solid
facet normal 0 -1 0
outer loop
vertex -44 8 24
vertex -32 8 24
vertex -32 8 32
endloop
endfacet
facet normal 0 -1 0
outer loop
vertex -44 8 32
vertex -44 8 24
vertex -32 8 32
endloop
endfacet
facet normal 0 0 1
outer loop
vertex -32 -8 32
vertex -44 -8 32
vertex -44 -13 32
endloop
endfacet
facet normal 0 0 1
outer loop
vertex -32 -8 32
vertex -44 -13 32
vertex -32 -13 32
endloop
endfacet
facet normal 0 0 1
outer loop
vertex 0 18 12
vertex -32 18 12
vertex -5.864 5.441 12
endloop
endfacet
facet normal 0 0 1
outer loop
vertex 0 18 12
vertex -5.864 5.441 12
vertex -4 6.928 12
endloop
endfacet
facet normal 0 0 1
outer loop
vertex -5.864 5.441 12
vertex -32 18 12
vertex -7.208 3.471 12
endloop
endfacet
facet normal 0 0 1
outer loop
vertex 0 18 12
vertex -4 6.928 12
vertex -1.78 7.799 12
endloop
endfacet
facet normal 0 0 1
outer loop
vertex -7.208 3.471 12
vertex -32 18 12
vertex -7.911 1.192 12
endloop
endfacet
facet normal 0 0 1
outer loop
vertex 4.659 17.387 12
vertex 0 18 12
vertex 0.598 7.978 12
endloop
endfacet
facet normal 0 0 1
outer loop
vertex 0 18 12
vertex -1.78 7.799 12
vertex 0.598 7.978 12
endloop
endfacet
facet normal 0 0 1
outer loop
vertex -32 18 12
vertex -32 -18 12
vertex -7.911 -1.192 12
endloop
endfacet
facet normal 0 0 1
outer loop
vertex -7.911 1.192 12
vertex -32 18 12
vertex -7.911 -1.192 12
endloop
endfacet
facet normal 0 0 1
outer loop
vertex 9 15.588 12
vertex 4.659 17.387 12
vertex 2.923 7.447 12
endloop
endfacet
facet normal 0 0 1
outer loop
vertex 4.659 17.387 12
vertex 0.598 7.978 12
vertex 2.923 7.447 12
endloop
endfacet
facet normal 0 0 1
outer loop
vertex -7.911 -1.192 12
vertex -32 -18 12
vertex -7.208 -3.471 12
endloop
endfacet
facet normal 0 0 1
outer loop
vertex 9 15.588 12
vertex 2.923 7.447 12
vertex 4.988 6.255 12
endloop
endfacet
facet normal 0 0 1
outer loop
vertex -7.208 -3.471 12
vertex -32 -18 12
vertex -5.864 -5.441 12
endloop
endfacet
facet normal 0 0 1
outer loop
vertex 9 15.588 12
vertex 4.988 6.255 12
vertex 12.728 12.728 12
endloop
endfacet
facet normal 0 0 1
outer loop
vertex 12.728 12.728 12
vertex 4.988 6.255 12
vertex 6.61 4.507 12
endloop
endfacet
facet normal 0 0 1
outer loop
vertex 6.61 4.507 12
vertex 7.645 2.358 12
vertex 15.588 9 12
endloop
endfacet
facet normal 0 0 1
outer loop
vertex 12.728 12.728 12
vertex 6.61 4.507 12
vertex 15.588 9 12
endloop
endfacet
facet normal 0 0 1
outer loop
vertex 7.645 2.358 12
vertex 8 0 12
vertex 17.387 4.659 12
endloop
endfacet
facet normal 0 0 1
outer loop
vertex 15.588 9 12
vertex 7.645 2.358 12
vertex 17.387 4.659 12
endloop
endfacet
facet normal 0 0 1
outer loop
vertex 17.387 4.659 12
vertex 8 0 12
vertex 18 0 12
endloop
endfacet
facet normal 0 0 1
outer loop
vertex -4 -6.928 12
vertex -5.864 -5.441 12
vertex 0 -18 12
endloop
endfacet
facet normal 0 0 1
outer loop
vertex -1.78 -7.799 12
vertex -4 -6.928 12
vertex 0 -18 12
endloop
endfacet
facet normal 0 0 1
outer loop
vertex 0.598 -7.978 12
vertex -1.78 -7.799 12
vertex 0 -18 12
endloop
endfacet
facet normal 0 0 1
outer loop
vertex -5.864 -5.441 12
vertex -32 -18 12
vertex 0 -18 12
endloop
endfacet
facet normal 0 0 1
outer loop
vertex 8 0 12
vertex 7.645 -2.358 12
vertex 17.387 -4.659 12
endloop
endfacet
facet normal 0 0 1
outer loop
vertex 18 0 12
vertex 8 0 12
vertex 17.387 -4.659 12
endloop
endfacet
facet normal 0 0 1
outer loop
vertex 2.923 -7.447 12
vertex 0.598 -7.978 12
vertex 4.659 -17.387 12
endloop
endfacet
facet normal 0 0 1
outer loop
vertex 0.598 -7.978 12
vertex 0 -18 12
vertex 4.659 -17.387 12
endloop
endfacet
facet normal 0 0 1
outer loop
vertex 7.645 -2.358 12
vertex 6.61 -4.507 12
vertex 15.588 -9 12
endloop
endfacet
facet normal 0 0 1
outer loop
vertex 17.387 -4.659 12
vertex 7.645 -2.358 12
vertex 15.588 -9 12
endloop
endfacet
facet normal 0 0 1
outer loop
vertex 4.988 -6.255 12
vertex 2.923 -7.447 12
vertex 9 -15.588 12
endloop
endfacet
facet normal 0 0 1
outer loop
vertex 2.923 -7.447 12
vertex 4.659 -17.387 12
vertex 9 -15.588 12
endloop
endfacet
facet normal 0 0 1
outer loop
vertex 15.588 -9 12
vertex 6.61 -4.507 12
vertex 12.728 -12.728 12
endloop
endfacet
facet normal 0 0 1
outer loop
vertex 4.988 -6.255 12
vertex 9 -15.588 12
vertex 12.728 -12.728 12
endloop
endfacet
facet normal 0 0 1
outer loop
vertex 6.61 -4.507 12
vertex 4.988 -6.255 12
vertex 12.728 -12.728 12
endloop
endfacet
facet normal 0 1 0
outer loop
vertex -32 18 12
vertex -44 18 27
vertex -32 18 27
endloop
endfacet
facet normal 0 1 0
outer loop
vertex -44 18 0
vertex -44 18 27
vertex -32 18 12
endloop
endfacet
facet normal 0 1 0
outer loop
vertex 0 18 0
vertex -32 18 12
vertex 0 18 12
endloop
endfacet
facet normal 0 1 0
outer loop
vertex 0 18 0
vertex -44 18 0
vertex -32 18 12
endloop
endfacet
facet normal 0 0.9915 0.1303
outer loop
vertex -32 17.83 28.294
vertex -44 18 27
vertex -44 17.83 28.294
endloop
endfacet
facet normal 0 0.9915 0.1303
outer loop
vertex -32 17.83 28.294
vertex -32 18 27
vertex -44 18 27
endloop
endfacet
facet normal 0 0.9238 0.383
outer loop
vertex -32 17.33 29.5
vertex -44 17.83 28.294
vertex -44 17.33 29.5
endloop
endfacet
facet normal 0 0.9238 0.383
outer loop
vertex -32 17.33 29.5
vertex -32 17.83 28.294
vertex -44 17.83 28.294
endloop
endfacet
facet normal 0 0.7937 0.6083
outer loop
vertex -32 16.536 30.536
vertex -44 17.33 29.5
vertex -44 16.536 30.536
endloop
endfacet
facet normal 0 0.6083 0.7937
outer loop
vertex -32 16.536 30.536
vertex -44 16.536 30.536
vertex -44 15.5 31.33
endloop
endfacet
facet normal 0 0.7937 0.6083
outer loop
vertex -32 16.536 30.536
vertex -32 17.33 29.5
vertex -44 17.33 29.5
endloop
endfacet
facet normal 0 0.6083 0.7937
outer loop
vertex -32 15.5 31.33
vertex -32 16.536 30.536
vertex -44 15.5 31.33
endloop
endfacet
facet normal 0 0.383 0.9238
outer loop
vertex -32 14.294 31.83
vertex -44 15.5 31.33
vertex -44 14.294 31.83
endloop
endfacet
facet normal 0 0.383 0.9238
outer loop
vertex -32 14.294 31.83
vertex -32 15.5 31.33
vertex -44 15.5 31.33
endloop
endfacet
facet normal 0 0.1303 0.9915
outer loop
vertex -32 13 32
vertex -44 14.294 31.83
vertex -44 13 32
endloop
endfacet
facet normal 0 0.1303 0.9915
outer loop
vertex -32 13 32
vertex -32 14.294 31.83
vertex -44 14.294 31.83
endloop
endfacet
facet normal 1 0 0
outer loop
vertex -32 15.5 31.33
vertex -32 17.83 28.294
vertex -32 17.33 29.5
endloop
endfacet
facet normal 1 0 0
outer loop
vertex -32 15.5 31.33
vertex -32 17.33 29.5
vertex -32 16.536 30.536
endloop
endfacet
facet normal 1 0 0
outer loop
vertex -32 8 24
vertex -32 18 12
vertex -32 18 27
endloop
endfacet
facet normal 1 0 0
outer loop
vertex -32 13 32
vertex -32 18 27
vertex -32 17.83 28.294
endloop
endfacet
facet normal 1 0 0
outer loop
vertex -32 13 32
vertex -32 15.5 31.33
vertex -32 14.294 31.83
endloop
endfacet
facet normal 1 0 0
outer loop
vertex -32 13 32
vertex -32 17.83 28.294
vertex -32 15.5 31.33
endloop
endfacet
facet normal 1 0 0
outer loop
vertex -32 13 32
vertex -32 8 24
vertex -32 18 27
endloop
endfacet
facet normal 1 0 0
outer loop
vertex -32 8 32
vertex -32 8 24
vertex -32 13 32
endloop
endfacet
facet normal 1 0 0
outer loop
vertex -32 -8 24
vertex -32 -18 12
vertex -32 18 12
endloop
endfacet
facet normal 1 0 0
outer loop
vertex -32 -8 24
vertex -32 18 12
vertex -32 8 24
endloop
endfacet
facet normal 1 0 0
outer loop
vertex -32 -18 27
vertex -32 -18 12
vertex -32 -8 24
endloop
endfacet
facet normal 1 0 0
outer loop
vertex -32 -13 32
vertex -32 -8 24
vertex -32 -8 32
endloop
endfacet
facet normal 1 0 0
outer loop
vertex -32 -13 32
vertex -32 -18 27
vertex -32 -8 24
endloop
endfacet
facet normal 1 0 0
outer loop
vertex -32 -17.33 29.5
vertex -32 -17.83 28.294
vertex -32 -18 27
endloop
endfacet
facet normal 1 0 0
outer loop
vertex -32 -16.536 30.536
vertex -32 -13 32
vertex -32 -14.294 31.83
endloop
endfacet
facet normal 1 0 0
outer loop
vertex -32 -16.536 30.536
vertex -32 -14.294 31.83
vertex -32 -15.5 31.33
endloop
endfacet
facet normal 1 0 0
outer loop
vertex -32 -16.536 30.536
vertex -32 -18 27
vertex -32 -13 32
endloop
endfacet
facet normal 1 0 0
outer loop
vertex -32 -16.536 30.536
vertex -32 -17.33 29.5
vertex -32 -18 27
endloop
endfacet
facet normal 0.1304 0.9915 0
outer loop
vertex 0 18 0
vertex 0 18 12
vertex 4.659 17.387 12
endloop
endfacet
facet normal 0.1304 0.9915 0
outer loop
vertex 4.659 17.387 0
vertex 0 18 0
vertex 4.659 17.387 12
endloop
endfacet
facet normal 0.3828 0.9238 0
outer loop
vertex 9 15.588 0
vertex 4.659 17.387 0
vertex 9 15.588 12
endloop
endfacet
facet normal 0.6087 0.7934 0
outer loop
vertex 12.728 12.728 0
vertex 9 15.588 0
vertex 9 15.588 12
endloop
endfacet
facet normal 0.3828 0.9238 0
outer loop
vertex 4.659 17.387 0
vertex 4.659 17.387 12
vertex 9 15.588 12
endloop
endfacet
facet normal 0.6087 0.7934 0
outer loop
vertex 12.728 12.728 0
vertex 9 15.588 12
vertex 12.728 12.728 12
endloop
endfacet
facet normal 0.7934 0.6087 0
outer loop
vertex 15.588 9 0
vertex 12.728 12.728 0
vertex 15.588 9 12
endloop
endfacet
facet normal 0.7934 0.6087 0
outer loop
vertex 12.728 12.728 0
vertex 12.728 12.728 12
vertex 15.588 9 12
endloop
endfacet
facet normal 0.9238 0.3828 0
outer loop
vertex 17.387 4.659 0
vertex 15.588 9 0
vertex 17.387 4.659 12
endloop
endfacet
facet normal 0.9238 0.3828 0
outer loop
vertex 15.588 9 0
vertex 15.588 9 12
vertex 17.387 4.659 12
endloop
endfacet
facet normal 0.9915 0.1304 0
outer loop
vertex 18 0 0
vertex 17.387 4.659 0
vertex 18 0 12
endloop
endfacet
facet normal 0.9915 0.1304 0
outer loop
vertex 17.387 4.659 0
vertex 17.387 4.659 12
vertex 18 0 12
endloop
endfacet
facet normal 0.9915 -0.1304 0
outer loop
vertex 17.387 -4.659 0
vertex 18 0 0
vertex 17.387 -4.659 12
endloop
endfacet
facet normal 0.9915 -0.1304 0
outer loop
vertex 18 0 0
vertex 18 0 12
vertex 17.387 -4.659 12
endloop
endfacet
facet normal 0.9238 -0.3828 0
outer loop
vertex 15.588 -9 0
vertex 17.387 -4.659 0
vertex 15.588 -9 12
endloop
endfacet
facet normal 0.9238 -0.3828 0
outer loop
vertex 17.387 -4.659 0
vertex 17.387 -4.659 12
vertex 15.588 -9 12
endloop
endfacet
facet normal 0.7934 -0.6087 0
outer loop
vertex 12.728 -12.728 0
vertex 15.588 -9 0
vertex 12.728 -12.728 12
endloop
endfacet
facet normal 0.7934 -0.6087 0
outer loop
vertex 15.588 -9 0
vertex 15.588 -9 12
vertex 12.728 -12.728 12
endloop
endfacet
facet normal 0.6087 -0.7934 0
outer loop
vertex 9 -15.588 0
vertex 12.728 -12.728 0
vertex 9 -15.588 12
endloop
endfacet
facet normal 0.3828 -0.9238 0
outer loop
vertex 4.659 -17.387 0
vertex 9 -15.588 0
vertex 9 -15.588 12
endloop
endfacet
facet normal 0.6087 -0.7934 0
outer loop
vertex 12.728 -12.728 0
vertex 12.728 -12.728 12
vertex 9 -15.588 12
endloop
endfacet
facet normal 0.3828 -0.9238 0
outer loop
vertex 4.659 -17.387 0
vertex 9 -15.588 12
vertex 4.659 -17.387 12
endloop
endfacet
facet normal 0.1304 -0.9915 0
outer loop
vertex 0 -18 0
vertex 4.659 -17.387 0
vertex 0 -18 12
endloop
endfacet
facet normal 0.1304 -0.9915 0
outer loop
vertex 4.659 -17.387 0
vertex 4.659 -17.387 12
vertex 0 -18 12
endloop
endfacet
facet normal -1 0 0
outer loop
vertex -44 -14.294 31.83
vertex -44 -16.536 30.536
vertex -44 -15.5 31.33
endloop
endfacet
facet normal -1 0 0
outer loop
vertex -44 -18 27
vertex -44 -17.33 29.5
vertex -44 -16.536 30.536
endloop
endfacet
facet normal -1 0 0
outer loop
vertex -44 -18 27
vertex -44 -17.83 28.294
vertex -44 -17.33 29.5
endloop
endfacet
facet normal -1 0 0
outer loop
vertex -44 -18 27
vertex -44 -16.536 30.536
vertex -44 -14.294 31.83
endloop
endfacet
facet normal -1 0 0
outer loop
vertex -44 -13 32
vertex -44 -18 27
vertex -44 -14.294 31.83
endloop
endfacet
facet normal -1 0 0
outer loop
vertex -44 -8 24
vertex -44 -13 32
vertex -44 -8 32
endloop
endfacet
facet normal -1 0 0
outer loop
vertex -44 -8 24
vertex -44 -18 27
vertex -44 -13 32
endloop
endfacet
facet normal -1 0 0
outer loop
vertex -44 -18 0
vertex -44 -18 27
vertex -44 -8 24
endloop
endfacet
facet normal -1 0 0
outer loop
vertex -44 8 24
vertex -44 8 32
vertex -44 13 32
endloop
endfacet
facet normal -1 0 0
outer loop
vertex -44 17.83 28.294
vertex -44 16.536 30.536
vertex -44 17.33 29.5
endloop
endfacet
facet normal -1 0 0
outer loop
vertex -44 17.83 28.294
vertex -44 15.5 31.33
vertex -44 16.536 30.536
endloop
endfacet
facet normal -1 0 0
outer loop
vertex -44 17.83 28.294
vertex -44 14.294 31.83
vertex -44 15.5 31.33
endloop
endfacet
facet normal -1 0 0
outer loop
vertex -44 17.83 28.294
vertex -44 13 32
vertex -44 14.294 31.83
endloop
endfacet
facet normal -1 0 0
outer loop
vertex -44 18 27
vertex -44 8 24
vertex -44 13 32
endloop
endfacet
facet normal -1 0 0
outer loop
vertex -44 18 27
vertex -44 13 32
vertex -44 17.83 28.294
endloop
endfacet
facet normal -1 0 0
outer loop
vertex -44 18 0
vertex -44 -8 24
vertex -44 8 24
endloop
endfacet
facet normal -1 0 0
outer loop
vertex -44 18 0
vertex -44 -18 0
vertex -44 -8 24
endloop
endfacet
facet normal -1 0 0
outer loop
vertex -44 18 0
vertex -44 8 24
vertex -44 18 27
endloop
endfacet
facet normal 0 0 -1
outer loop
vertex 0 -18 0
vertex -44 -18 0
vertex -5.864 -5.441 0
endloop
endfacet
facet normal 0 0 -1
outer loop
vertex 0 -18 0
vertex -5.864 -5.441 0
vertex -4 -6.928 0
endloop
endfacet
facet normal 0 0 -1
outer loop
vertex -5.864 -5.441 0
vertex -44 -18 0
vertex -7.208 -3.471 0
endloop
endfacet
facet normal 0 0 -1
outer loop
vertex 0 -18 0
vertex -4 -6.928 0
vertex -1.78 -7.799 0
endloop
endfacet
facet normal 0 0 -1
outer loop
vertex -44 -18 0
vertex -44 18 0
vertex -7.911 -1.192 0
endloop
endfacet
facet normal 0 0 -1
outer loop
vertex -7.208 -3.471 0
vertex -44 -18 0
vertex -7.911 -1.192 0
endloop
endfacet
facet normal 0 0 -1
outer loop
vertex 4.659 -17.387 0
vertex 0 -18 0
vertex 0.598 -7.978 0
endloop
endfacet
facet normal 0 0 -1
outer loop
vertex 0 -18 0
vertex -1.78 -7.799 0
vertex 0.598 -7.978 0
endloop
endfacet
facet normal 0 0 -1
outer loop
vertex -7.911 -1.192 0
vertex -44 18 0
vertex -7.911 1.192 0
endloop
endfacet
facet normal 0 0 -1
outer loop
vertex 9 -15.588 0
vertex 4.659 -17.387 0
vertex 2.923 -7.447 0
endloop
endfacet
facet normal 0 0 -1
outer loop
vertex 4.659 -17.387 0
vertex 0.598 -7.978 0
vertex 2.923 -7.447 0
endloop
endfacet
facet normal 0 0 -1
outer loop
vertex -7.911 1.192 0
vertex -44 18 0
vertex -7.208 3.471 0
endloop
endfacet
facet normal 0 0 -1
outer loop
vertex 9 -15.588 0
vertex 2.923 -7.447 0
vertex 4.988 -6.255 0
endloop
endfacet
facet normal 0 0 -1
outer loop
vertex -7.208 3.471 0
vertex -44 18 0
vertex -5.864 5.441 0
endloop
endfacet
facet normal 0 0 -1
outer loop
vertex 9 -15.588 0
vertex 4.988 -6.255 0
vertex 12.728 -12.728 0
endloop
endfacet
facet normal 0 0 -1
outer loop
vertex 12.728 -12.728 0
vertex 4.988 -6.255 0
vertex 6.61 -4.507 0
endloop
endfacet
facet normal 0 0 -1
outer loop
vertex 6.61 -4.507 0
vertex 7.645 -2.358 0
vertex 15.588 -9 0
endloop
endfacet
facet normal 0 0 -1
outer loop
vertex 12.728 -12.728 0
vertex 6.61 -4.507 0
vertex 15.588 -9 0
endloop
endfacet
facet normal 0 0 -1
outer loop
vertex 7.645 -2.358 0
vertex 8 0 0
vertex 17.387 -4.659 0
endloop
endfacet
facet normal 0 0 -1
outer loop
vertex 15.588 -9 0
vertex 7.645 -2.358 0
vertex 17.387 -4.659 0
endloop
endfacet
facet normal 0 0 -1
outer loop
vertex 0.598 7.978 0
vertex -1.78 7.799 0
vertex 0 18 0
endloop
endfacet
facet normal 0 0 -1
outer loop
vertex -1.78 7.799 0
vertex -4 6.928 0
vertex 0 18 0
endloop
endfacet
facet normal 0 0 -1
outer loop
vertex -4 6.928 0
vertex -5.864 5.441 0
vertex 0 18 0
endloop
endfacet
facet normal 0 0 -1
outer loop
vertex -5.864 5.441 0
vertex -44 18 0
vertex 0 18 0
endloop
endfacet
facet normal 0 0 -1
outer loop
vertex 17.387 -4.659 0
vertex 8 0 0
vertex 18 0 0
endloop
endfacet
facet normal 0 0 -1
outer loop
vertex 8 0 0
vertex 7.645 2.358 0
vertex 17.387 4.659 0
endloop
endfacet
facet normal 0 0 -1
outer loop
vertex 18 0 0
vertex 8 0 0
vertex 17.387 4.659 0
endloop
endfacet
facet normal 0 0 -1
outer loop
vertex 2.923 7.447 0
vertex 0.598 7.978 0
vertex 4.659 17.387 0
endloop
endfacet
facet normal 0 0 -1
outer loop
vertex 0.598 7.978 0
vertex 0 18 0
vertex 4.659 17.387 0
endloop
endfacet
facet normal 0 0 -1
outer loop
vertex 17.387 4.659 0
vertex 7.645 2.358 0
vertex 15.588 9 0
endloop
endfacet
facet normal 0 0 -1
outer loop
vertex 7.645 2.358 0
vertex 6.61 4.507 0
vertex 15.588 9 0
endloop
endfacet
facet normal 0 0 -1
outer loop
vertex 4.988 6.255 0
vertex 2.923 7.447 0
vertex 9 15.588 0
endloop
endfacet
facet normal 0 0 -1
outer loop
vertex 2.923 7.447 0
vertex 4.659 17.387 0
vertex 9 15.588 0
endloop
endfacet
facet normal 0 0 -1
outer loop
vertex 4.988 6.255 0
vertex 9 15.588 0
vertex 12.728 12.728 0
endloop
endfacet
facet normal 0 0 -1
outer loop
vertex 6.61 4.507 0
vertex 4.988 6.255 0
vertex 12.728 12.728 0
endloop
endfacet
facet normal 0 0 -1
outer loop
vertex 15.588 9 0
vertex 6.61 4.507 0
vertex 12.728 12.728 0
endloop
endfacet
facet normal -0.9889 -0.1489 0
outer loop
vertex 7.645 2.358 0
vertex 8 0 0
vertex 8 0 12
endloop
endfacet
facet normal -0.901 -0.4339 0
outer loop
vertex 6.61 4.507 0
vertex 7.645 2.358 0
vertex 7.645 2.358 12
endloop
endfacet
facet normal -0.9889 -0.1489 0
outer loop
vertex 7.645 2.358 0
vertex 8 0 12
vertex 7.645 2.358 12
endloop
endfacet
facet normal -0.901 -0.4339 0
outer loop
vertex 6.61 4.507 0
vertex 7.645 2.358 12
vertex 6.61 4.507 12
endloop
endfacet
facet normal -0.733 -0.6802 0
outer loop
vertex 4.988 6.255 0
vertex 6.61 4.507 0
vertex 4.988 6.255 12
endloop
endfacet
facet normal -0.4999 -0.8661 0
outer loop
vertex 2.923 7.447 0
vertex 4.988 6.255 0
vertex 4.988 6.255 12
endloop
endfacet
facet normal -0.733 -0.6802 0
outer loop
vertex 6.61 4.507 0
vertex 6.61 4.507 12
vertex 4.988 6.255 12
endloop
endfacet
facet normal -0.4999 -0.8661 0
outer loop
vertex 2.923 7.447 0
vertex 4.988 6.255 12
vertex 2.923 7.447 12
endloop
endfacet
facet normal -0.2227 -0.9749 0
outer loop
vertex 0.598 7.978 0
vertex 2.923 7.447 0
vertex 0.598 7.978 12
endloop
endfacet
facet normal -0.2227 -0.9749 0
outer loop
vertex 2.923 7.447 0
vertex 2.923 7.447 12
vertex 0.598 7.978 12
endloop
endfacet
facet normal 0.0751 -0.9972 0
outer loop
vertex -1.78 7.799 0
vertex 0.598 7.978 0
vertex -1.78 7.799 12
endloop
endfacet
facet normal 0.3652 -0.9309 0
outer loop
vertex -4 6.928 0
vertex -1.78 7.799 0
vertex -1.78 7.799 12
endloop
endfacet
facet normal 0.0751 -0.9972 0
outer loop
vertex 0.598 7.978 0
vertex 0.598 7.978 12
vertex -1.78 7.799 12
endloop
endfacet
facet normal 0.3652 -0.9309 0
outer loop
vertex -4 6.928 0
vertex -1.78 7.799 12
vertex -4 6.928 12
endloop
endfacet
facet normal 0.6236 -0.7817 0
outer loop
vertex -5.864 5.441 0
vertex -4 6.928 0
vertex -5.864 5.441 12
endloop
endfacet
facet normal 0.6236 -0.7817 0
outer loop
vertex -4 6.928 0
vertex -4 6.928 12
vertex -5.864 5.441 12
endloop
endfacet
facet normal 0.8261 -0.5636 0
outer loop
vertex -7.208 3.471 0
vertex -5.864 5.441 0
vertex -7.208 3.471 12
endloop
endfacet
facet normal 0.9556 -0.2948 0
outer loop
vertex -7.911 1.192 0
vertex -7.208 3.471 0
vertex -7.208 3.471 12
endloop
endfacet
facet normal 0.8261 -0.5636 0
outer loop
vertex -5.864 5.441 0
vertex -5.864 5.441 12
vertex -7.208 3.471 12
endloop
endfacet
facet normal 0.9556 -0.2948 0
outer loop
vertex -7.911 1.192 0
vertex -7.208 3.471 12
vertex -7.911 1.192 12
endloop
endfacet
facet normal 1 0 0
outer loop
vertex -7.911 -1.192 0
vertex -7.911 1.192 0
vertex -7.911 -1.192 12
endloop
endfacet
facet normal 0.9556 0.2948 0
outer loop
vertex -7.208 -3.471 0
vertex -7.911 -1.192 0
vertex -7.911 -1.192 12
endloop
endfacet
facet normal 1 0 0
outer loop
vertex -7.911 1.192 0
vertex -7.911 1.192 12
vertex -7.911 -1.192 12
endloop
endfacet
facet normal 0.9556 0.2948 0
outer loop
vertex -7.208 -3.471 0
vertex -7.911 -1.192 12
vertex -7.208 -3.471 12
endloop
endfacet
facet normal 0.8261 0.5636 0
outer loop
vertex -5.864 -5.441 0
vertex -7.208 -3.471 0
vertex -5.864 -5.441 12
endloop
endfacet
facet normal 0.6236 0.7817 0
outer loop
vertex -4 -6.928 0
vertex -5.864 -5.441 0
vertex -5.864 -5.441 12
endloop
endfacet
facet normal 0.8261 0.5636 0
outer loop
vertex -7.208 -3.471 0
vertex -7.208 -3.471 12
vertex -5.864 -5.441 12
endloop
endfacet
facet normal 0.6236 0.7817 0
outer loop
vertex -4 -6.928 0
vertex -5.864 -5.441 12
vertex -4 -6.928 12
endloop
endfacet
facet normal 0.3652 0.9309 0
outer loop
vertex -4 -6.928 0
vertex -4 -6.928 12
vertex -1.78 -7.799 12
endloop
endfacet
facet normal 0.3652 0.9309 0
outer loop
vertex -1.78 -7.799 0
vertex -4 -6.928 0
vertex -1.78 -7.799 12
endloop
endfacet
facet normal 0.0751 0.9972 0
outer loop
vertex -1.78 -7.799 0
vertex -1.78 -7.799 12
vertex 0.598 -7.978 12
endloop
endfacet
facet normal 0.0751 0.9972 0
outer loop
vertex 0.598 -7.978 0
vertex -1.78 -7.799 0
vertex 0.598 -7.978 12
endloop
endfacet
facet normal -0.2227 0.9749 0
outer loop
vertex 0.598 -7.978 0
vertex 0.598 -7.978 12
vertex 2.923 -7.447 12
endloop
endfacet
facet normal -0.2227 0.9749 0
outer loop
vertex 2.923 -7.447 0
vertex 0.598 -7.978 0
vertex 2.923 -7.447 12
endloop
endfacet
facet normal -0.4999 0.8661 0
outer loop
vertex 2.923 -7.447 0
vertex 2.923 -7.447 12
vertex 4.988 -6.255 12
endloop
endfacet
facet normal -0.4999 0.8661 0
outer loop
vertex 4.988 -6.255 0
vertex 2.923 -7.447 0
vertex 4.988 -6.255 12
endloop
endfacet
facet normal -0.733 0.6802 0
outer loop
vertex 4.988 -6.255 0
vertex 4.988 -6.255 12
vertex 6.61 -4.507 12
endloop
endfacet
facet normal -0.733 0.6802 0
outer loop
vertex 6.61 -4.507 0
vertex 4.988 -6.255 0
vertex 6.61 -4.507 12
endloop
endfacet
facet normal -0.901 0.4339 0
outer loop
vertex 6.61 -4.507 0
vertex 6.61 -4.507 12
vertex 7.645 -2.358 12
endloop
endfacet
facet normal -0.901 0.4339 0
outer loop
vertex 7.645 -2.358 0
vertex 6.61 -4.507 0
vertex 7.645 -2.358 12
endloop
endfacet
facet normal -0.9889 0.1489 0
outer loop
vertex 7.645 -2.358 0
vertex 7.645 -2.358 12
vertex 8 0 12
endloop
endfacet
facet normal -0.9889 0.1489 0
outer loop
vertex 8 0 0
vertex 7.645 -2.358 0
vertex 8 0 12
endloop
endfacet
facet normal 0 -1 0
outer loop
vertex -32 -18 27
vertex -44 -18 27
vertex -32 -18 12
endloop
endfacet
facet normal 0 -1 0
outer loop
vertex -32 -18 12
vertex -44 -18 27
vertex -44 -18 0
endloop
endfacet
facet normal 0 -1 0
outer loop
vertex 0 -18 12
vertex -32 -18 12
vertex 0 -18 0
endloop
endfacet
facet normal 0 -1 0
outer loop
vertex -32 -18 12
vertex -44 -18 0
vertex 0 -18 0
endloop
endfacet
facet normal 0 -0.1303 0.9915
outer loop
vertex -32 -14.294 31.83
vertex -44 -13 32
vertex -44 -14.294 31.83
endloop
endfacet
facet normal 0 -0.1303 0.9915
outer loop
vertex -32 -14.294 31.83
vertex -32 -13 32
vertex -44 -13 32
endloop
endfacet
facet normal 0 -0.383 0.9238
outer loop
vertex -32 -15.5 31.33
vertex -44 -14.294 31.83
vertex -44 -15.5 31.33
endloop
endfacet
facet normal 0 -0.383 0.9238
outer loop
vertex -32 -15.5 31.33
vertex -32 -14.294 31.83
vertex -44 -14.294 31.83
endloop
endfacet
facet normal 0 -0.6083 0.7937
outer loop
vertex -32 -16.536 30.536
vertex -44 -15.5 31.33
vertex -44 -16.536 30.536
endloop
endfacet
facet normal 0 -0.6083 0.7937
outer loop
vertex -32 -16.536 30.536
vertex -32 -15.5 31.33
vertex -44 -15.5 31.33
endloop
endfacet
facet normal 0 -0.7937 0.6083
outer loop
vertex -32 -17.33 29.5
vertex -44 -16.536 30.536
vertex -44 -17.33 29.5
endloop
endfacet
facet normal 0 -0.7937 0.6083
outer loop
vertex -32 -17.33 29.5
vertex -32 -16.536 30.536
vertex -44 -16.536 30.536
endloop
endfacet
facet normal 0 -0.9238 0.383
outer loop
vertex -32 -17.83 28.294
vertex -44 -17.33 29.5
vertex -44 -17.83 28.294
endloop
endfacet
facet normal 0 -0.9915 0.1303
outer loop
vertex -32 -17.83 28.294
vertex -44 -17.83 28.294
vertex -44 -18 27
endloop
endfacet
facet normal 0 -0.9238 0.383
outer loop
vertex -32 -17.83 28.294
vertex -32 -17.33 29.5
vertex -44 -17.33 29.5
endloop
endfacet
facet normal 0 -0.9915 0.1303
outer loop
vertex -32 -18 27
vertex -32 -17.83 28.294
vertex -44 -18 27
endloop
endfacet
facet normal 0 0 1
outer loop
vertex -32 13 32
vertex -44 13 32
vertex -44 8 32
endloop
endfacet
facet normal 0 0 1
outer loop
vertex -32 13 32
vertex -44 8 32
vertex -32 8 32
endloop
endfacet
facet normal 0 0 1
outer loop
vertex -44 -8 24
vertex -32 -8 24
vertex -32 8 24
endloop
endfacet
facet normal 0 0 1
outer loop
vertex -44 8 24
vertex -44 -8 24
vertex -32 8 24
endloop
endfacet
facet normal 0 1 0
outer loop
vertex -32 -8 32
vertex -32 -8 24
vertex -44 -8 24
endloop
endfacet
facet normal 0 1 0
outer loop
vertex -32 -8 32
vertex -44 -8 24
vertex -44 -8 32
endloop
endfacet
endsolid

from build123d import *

# Parameters (mm, degrees)
F0_W     = 62
F0_H     = 36
F1_DEPTH = 32
F2_W     = 60
F2_H     = 30
F3_DEPTH = 36.001
F5_DEPTH = 12.001
F6_W     = 16
F6_H     = 12
F7_DEPTH = 12.001
F8_R     = 8
F9_DEPTH = 12.001
F10_R    = 5


with BuildPart() as f1:
    # F0 (on Top) → F1 (new body)
    with BuildSketch(Plane.XY):
        with Locations((-13, 0)):
            Rectangle(F0_W, F0_H)
    extrude(amount=F1_DEPTH)

    # F2 (on face) → F3 (cut, through all)
    with BuildSketch(Plane.XZ.offset(18)):
        with Locations((-2, 27)):
            Rectangle(F2_W, F2_H)
    extrude(amount=-F3_DEPTH, mode=Mode.SUBTRACT)

    # F4 (on face) → F5 (cut, through all)
    with BuildSketch(Plane.XY.offset(12)):
        with BuildLine():
            ThreePointArc((0, 18), (18, 0), (0, -18))
            Line((0, -18), (0, -28))
            Line((0, -28), (28, -28))
            Line((28, -28), (28, 28))
            Line((28, 28), (0, 28))
            Line((0, 28), (0, 18))
        make_face()
    extrude(amount=-F5_DEPTH, mode=Mode.SUBTRACT)

    # F6 (on face) → F7 (cut, through all)
    with BuildSketch(Plane.YZ.offset(-32)):
        with Locations((0, 30)):
            Rectangle(F6_W, F6_H)
    extrude(amount=-F7_DEPTH, mode=Mode.SUBTRACT)

    # F8 (on face) → F9 (cut, through all)
    with BuildSketch(Plane.XY.offset(12)):
        Circle(F8_R)
    extrude(amount=-F9_DEPTH, mode=Mode.SUBTRACT)

    # F10
    f10_edges = [f1.edges().sort_by_distance(p)[0] for p in [
        (-38, 18, 32),
        (-38, -18, 32),
    ]]
    fillet(f10_edges, radius=F10_R)


solid = f1.part
